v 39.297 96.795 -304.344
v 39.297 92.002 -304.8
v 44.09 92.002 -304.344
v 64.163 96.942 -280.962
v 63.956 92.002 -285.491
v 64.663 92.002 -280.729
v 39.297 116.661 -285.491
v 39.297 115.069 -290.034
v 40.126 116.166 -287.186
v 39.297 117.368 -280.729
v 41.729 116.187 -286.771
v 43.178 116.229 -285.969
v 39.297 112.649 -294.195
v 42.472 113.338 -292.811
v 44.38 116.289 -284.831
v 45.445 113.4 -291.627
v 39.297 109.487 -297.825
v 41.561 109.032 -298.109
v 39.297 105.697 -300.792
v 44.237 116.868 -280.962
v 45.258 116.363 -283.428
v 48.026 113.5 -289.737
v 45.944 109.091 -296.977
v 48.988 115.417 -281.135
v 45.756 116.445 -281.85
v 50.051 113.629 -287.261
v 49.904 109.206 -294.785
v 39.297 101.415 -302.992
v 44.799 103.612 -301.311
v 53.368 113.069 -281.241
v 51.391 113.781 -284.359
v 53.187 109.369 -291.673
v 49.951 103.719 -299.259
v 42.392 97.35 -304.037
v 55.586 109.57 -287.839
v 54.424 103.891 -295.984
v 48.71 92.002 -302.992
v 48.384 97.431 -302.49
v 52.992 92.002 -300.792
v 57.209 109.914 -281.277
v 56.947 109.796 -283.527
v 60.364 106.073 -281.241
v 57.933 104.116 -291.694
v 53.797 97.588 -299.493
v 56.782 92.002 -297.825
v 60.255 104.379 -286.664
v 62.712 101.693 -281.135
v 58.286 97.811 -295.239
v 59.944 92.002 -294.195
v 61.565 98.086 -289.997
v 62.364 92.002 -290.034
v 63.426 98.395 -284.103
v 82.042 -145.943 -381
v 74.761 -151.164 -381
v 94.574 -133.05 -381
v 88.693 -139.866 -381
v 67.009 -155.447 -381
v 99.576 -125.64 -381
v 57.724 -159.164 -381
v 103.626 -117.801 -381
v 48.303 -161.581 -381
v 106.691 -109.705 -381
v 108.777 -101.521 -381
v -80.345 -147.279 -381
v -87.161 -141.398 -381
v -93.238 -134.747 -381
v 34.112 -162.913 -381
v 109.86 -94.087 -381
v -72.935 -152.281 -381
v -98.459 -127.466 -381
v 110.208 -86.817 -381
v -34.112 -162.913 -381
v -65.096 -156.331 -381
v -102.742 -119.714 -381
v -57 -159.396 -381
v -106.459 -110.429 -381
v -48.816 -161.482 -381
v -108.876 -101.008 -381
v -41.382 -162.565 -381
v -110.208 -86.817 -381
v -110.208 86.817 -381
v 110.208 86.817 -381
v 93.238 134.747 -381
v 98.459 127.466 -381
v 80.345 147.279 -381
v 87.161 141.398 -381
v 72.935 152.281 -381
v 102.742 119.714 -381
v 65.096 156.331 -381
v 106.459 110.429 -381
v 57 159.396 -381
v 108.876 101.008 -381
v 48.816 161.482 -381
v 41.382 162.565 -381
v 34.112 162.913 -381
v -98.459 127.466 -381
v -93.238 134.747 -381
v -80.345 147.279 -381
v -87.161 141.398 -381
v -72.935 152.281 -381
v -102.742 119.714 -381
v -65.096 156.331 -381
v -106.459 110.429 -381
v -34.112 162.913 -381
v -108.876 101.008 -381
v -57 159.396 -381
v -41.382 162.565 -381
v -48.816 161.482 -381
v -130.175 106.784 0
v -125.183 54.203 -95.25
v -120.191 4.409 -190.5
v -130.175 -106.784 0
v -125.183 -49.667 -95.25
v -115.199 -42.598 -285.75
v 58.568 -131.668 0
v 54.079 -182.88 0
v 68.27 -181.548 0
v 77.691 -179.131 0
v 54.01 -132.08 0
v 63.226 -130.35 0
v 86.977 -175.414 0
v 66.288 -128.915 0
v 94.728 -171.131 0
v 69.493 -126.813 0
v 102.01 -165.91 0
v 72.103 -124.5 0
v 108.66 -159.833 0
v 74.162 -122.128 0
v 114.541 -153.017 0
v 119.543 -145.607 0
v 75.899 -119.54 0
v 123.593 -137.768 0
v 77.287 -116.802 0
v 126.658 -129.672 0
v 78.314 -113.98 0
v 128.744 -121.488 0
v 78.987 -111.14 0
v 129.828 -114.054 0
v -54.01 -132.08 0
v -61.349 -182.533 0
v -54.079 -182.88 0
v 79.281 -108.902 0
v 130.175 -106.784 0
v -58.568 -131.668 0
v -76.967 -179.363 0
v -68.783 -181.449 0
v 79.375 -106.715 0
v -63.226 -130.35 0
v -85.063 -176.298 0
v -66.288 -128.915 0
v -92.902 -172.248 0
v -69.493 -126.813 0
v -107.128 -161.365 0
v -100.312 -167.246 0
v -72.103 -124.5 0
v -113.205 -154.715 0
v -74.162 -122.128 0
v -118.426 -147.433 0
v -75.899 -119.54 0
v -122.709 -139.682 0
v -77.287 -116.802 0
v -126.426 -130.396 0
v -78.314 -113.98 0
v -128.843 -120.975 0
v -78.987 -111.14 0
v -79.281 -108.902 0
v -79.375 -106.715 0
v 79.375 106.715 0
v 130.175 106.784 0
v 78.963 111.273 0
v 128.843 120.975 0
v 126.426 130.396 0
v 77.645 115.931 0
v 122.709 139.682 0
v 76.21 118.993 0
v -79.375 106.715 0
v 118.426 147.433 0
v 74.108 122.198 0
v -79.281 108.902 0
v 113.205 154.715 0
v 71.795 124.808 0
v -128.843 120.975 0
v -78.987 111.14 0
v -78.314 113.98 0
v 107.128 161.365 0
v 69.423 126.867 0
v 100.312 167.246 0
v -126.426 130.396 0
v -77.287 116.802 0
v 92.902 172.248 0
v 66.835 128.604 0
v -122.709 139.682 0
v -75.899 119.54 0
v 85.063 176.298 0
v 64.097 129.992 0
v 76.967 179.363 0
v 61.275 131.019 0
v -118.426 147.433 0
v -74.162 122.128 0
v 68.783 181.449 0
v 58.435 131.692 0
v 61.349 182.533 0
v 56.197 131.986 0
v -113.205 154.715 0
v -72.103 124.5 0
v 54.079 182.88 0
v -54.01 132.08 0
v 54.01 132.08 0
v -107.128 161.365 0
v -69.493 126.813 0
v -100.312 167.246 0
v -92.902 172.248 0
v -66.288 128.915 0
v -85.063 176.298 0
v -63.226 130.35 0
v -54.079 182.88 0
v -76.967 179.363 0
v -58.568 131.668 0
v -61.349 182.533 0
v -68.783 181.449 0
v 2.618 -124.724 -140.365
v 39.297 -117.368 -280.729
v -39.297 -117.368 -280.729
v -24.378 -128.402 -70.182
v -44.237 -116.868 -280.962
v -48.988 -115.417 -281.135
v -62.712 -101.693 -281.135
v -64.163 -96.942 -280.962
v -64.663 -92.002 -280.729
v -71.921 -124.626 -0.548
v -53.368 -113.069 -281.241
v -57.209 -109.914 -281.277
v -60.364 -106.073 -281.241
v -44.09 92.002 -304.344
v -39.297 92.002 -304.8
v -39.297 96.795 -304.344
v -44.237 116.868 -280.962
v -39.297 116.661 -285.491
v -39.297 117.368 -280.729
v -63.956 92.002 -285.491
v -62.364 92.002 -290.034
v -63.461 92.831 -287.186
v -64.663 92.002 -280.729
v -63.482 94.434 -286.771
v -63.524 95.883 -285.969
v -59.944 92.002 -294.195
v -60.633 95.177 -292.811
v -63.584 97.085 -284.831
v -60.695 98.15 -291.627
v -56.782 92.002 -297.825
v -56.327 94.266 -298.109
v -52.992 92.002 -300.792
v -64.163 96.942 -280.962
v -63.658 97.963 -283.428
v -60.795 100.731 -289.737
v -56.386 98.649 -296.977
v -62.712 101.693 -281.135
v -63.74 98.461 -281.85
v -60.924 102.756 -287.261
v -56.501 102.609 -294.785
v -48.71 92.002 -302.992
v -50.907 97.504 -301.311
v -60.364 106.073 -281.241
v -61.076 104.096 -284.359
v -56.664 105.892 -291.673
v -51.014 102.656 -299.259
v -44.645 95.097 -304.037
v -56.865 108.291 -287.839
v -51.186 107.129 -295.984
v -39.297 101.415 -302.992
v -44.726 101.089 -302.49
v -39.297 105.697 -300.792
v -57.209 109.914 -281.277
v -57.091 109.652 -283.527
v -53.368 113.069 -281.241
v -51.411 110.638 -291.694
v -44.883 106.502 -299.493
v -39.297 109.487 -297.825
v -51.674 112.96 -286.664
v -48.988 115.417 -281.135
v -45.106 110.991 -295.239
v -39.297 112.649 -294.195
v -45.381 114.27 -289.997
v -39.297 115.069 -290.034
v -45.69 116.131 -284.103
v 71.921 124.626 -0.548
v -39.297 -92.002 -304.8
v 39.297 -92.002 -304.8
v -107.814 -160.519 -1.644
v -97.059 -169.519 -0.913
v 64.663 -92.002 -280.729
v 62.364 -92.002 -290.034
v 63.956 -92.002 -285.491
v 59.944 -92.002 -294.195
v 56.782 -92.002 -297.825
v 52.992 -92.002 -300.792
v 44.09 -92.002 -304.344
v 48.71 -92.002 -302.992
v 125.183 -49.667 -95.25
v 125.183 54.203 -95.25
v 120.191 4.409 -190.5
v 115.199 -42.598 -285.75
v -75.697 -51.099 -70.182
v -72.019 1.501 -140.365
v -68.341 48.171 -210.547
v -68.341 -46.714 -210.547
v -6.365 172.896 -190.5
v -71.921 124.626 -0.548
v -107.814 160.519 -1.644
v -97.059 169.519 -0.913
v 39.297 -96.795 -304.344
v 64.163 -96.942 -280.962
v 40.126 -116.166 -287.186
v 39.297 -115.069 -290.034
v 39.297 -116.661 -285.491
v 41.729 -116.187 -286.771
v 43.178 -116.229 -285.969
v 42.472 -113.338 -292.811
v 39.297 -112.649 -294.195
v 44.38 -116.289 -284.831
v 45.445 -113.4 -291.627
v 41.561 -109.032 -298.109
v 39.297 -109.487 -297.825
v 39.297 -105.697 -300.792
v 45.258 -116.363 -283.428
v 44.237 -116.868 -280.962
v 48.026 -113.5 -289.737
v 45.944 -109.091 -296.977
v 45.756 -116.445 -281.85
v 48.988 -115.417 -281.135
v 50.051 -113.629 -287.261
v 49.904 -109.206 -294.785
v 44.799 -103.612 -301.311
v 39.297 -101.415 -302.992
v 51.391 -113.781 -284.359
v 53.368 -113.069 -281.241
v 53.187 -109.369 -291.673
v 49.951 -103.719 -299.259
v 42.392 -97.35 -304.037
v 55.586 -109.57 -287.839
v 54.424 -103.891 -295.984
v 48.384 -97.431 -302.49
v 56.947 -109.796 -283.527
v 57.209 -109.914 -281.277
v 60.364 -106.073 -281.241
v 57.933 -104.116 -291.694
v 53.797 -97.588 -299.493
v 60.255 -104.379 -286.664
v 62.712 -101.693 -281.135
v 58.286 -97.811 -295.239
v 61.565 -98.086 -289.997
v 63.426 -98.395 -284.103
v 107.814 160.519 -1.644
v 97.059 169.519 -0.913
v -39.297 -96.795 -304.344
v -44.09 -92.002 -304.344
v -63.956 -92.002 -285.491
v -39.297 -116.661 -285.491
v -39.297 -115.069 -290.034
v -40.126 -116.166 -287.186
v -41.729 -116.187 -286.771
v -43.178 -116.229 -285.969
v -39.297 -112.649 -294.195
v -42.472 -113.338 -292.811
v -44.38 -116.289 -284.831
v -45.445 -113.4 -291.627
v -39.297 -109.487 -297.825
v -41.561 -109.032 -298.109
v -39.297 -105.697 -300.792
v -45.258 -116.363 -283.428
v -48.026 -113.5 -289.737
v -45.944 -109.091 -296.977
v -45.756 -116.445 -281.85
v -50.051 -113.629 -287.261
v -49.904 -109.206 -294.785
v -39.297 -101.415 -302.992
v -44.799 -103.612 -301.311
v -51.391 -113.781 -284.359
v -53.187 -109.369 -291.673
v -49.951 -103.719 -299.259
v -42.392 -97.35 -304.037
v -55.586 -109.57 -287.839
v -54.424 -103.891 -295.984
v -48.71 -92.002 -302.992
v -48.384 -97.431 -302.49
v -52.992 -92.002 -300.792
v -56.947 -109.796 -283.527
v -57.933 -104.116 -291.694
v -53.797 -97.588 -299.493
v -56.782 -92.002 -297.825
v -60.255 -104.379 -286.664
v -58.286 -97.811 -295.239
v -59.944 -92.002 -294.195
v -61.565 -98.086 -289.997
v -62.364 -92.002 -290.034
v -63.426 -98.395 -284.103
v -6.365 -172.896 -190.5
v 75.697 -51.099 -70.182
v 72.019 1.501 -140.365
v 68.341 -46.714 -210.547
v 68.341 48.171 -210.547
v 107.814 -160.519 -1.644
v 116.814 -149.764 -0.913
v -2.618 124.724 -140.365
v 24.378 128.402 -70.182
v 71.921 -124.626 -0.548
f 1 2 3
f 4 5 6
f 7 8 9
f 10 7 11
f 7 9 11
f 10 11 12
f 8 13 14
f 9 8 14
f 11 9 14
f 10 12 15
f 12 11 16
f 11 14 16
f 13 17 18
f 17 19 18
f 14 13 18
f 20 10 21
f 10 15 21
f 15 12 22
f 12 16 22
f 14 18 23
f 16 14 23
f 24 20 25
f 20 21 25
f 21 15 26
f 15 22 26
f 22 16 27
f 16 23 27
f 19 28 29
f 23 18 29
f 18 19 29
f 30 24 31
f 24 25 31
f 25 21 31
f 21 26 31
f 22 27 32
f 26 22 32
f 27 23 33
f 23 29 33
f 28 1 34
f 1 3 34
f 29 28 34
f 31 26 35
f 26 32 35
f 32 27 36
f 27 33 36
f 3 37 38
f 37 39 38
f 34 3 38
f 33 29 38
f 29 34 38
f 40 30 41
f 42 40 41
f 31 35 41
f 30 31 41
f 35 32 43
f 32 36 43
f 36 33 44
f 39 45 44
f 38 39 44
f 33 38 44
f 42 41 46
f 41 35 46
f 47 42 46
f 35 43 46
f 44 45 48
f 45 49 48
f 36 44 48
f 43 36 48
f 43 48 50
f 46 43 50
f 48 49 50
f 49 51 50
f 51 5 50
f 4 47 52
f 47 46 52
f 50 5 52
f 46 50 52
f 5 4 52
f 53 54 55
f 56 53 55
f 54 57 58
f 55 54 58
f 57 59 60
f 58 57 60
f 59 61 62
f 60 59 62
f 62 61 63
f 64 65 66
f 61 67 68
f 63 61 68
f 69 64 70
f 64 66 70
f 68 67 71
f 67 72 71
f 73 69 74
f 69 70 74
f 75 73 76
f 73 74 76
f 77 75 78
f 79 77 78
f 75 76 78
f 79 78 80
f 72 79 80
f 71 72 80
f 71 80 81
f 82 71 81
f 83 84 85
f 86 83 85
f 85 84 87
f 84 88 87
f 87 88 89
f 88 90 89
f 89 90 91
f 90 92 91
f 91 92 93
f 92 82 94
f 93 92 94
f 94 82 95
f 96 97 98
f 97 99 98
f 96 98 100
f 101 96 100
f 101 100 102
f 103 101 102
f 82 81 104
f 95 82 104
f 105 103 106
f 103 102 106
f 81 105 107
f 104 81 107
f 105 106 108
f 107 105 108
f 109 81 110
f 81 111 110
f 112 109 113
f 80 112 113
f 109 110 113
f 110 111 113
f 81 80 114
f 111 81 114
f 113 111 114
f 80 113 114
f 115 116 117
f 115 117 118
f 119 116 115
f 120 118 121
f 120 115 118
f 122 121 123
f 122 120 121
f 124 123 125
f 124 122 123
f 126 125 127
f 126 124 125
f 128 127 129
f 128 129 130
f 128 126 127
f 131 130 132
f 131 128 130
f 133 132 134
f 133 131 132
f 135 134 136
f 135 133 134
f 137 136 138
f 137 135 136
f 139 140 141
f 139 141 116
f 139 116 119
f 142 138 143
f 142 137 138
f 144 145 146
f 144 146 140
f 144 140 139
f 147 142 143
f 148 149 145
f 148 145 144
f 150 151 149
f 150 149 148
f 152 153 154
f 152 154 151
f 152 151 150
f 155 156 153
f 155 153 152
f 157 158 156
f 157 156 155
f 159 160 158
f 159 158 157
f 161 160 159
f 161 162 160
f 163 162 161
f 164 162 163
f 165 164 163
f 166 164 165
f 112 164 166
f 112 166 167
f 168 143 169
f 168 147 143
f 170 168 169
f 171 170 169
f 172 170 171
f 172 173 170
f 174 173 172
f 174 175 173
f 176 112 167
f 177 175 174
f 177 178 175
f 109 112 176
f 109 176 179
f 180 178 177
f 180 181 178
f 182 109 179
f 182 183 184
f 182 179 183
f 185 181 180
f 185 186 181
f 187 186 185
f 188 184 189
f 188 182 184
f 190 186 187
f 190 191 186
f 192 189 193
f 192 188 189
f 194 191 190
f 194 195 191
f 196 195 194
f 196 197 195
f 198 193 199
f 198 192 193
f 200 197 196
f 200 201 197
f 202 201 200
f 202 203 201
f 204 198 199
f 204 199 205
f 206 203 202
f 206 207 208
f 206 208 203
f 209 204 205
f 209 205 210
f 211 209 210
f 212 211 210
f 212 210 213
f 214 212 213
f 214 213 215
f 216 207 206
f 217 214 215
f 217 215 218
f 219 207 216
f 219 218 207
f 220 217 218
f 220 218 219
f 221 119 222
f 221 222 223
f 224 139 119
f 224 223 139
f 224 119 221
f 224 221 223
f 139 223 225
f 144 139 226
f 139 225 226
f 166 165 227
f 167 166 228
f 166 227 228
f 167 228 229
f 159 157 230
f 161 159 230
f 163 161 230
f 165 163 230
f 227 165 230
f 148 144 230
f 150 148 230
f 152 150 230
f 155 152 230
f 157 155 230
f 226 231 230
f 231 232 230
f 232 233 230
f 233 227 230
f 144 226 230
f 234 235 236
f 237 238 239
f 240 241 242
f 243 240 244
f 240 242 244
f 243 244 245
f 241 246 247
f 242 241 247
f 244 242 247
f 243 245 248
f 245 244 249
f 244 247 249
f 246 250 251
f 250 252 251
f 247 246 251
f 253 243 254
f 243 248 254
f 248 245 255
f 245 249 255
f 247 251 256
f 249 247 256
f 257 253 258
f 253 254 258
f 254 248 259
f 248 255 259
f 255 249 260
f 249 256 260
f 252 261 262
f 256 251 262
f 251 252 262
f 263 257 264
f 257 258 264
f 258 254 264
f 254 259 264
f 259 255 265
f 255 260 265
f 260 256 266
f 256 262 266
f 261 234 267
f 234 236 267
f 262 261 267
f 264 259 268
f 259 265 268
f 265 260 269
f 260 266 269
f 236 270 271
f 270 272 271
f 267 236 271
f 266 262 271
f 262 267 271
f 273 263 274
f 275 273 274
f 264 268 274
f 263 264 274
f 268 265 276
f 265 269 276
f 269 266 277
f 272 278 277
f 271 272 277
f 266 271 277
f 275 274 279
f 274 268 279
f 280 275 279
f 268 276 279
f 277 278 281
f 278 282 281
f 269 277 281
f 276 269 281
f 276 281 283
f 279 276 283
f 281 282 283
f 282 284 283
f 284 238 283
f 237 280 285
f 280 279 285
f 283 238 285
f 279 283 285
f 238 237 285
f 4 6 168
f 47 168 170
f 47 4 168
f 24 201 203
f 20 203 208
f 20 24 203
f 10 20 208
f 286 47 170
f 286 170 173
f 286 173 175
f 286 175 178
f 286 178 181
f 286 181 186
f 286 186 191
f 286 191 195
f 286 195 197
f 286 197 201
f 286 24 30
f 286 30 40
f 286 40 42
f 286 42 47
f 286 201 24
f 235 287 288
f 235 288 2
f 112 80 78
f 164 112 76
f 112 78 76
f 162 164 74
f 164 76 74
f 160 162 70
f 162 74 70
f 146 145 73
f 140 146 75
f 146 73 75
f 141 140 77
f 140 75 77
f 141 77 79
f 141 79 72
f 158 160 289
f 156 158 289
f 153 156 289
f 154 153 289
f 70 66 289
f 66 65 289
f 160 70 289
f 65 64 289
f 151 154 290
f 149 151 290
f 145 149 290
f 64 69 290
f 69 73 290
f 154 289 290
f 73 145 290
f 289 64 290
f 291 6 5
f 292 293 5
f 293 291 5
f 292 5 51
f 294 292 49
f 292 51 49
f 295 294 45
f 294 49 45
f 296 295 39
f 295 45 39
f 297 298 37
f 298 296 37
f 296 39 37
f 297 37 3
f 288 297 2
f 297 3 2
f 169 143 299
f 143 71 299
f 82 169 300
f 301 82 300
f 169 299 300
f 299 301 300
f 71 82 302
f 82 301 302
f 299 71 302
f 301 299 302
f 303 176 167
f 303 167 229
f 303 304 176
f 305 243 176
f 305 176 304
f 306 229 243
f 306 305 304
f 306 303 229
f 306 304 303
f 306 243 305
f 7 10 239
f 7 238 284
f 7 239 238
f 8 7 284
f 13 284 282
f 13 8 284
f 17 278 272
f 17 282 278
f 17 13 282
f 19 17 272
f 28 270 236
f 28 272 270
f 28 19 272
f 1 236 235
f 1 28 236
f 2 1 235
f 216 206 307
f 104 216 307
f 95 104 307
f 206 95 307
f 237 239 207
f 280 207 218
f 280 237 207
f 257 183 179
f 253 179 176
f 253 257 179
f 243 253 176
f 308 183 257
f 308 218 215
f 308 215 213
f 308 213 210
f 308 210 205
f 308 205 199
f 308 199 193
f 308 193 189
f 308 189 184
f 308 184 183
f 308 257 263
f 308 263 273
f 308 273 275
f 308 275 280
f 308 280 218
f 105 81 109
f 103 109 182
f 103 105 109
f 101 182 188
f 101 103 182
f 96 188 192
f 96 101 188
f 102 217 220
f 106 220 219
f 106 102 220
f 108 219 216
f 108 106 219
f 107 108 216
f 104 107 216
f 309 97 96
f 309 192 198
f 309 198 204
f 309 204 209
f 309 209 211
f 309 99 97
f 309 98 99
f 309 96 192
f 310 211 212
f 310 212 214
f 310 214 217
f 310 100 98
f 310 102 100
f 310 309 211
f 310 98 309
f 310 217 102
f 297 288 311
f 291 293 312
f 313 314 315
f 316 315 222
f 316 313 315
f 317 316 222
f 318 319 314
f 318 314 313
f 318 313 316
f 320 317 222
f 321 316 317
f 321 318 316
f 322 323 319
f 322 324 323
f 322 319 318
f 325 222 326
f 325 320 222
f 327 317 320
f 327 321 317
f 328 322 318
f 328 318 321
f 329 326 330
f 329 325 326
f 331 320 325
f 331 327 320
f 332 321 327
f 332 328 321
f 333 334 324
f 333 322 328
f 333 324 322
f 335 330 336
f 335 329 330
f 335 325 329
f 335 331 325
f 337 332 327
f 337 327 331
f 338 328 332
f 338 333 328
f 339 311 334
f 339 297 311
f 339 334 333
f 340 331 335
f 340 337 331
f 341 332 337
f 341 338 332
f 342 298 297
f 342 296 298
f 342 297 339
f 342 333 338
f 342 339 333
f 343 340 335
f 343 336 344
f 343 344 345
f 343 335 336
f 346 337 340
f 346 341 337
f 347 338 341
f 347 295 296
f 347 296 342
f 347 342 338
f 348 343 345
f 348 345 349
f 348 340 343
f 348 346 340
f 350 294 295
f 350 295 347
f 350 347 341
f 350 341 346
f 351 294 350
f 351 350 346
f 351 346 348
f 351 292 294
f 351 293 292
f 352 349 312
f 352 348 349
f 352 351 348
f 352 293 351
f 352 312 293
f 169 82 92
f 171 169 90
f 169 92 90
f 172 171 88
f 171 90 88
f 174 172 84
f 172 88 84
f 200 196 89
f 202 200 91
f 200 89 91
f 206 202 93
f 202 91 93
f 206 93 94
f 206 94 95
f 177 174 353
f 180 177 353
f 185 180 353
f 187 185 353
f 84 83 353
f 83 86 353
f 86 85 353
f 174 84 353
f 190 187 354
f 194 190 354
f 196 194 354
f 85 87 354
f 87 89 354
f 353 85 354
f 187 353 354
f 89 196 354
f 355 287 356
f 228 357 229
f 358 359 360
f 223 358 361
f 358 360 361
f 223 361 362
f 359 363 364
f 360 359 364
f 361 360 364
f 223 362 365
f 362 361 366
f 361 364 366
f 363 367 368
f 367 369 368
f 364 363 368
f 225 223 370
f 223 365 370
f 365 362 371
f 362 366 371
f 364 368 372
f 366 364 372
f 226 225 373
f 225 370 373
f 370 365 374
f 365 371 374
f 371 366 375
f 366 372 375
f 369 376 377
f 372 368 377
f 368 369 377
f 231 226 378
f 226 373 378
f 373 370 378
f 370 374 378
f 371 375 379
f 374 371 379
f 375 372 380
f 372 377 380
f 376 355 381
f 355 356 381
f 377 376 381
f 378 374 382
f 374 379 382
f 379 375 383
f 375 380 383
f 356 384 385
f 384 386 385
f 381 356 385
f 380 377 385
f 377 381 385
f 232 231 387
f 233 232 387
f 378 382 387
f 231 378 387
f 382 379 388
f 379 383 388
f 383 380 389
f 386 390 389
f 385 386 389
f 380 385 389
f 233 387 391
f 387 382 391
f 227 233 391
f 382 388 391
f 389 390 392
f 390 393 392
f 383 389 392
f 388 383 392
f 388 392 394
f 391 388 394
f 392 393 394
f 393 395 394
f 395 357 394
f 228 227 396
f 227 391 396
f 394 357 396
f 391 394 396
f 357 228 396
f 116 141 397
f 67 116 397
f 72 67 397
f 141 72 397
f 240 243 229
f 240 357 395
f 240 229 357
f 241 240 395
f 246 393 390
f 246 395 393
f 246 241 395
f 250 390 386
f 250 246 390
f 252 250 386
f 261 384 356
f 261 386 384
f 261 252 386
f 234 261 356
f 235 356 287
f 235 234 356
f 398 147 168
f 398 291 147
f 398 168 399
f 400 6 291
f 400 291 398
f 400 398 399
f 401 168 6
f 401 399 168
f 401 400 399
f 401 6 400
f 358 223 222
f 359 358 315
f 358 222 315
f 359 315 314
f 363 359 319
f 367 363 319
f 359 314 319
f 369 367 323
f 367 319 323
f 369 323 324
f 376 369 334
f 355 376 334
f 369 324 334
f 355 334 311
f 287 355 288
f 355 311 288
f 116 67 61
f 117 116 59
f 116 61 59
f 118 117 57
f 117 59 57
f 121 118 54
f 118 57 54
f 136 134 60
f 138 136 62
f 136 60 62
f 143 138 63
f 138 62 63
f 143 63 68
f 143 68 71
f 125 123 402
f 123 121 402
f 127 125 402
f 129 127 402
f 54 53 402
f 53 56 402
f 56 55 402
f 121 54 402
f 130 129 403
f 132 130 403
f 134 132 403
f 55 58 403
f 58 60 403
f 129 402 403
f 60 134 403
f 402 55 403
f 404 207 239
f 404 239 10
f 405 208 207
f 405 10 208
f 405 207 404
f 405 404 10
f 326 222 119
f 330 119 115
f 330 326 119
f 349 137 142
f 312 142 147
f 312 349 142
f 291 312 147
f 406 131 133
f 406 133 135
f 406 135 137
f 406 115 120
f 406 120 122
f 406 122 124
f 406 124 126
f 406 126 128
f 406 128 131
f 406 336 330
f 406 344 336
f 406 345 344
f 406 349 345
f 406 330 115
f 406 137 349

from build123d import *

# Parameters (mm, degrees)
F0_W     = 260.35
F0_H     = 365.76
F0_W_2   = 158.75
F0_H_2   = 264.16
F1_DEPTH = 381
F1_TAPER = 3
F2_R     = 76.2
F3_DEPTH = 304.8
F3_TAPER = 3
F4_R     = 25.4


with BuildPart() as f1:
    # F0 (on Top) → F1 (new body)
    with BuildSketch(Plane.XY):
        Rectangle(F0_W, F0_H)
        Rectangle(F0_W_2, F0_H_2, mode=Mode.SUBTRACT)
        Rectangle(F0_W_2, F0_H_2)
    extrude(amount=-F1_DEPTH, taper=F1_TAPER)

    # F2
    f2_edges = [f1.edges().sort_by_distance(p)[0] for p in [
        (-120.191318, -172.896318, -190.5),
        (120.191318, -172.896318, -190.5),
        (120.191318, 172.896318, -190.5),
        (-120.191318, 172.896318, -190.5),
    ]]
    fillet(f2_edges, radius=F2_R)

    # F0 (on Top) → F3 (cut)
    with BuildSketch(Plane.XY):
        Rectangle(F0_W_2, F0_H_2)
    extrude(amount=-F3_DEPTH, taper=F3_TAPER, mode=Mode.SUBTRACT)

    # F4
    f4_edges = [f1.edges().sort_by_distance(p)[0] for p in [
        (63.401109, 0, -304.8),
        (0, 116.106109, -304.8),
        (-63.401109, 0, -304.8),
        (0, -116.106109, -304.8),
        (-71.388054, 124.093054, -152.4),
        (71.388054, 124.093054, -152.4),
        (71.388054, -124.093054, -152.4),
        (-71.388054, -124.093054, -152.4),
    ]]
    fillet(f4_edges, radius=F4_R)


solid = f1.part
